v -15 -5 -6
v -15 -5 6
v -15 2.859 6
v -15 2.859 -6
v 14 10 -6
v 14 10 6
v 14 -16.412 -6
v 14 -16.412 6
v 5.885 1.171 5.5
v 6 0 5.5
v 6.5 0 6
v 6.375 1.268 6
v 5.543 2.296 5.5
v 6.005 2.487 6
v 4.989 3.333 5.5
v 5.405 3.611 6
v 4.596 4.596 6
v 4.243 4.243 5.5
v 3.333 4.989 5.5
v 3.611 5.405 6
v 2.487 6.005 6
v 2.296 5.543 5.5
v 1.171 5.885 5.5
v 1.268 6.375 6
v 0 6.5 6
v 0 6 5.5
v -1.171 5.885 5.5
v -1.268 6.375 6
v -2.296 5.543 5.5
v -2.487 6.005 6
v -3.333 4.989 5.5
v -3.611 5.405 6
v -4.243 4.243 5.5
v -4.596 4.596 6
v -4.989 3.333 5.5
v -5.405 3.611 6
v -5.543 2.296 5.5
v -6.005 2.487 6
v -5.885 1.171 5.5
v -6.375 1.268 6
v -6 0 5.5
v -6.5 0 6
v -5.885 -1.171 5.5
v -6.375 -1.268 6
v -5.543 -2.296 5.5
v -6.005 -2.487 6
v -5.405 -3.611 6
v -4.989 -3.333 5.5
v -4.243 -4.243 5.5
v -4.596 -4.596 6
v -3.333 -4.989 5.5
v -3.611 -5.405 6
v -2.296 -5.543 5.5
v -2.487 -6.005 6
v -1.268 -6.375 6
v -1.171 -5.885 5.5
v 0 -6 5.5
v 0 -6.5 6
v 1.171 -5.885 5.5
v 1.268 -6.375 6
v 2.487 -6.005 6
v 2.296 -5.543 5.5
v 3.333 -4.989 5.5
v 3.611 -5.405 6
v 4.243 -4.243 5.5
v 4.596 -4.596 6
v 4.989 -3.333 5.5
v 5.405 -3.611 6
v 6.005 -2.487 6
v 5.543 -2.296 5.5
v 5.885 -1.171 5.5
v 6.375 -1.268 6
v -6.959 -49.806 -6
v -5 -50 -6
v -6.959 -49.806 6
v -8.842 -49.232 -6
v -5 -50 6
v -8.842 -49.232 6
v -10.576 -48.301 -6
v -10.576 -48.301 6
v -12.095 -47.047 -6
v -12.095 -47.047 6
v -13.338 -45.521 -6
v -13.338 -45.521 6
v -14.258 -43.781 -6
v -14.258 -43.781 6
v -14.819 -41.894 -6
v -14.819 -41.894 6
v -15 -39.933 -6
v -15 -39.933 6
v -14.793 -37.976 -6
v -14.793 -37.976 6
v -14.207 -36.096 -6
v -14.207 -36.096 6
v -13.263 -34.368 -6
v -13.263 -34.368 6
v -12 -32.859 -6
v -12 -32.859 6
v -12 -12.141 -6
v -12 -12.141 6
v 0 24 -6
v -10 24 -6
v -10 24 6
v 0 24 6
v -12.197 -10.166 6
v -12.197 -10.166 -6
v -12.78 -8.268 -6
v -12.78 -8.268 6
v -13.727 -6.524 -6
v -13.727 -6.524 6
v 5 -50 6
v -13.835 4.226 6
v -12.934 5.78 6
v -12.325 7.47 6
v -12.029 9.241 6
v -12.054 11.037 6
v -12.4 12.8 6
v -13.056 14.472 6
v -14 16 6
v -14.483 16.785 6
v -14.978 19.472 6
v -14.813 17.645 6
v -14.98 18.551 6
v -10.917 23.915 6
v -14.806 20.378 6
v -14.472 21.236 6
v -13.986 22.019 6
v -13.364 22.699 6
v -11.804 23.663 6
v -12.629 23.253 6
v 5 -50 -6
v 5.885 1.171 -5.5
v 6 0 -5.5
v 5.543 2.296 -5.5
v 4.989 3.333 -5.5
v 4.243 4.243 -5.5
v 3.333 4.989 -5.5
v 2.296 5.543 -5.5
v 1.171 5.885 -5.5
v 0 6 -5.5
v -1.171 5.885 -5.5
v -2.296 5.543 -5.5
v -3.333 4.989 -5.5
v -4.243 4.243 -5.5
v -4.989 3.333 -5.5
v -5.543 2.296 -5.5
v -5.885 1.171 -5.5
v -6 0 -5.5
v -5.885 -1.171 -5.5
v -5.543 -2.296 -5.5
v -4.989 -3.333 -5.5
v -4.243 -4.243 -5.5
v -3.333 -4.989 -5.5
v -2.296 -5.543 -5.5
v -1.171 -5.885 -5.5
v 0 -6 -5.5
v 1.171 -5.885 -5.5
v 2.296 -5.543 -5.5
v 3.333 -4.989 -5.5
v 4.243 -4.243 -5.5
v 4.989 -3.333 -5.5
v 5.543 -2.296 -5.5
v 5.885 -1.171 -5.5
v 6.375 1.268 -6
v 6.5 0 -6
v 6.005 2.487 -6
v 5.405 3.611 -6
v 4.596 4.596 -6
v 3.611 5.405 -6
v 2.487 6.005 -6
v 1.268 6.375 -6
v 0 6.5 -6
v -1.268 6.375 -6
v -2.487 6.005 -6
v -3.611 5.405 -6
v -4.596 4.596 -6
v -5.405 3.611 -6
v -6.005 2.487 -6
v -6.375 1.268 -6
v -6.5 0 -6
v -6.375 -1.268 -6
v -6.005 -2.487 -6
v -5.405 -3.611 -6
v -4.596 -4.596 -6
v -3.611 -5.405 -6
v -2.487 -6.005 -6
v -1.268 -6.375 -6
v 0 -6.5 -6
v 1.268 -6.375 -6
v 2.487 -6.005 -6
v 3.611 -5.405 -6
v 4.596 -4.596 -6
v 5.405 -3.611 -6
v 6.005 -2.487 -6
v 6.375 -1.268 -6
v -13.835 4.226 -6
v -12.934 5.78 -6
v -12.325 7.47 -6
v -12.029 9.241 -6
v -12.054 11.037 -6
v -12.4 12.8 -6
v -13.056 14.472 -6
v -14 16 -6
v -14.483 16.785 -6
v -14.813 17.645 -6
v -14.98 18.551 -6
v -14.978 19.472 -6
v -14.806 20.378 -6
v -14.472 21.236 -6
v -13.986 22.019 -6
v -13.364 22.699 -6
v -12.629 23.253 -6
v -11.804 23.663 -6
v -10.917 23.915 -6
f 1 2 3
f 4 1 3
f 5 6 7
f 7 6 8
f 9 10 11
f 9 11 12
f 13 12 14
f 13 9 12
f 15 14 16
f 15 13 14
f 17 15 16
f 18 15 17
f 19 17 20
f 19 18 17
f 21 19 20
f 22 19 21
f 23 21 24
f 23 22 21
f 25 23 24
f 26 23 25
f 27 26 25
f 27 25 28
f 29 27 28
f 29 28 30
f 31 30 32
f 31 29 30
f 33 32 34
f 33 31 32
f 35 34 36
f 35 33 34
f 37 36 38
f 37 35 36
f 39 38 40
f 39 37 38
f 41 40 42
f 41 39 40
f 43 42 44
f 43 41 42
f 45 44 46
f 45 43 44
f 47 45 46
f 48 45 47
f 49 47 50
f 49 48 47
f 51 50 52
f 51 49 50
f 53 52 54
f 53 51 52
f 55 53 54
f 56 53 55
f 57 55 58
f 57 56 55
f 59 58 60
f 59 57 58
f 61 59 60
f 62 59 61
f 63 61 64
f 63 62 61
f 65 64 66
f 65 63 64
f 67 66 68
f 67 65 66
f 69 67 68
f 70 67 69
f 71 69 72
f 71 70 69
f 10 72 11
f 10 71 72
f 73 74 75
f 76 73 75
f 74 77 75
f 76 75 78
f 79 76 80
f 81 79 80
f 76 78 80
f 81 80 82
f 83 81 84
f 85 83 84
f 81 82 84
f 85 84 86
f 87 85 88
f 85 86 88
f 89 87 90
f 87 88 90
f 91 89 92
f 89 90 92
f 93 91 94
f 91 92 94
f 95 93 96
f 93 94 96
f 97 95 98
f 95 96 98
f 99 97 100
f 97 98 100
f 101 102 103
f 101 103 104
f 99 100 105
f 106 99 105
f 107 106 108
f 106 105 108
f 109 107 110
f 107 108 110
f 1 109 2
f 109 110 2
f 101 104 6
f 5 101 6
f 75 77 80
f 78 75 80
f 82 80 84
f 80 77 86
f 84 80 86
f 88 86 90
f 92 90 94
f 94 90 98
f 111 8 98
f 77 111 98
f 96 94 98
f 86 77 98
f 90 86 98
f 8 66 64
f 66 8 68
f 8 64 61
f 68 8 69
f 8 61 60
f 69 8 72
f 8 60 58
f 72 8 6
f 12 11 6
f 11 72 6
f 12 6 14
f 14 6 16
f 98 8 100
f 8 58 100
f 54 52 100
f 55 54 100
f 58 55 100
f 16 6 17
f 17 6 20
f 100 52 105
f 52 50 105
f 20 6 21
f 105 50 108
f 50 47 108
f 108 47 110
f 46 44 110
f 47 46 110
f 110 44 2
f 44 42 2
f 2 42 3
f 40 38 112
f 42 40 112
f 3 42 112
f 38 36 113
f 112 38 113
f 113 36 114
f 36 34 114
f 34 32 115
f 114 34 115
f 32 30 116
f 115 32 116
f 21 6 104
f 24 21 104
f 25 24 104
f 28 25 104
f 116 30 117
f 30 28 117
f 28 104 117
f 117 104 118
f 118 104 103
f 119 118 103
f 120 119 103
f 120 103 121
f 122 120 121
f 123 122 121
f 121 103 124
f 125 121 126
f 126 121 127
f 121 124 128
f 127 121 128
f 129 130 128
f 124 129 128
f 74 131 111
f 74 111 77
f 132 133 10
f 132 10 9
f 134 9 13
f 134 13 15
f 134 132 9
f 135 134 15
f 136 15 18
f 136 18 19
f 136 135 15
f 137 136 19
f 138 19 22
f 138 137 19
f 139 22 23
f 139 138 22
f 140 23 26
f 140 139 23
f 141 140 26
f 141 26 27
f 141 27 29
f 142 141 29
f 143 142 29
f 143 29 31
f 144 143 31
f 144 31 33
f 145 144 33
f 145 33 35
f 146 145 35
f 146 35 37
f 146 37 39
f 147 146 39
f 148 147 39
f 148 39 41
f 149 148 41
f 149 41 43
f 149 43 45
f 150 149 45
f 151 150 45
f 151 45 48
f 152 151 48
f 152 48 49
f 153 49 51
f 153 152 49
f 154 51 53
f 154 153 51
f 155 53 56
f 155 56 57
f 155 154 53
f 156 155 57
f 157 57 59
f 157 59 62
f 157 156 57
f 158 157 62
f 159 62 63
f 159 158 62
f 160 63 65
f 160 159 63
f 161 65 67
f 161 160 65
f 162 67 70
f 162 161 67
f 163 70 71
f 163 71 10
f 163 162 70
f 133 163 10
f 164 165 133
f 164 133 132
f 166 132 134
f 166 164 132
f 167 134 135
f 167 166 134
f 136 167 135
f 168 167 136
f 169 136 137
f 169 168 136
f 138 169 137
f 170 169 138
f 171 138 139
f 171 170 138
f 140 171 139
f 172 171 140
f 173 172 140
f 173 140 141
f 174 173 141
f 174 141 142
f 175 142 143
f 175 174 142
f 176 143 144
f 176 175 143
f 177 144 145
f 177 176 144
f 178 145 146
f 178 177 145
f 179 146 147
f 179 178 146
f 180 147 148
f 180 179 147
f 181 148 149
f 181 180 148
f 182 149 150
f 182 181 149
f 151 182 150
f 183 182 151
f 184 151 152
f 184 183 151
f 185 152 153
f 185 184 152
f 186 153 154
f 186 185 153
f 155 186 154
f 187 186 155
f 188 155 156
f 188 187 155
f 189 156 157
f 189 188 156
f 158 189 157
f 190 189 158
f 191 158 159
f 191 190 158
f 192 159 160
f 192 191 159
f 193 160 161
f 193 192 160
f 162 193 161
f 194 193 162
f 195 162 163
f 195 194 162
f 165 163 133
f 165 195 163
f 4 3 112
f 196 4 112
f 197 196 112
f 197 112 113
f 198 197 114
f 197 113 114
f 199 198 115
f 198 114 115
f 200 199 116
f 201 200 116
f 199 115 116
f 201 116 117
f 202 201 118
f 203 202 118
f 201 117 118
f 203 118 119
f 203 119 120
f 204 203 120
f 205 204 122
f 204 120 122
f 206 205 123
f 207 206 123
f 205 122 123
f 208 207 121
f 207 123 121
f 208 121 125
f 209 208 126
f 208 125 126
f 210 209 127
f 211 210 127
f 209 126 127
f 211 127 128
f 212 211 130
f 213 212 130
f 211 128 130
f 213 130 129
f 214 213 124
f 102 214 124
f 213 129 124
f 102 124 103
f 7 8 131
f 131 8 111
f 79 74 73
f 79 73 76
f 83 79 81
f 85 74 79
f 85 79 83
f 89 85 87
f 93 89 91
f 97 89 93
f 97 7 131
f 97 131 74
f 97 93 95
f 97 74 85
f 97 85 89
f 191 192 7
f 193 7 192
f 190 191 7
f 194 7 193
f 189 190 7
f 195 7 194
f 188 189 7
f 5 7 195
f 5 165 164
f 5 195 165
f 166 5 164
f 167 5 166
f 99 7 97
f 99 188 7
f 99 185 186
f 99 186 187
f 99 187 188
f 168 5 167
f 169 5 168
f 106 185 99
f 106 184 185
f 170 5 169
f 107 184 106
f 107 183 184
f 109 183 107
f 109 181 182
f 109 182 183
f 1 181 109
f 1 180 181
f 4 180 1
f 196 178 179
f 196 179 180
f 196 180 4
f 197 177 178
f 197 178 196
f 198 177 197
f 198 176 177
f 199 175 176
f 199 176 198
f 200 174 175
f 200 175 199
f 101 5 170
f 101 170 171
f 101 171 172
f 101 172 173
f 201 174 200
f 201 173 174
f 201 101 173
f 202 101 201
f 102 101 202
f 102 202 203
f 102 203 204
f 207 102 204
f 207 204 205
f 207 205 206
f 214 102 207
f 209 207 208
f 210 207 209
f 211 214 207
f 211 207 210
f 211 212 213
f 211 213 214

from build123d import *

# Parameters (mm, degrees)
SKETCH_1_R      = 6
EXTRUDE_1_DEPTH = 6
CHAMFER_1_SIZE  = 0.5


with BuildPart() as part:
    # Эскиз1 → Бобышка-Вытянуть1 (new, symmetric)
    with BuildSketch(Plane.XY):
        with BuildLine():
            Line((0, 24), (14, 10))
            Line((14, 10), (14, -16.411542732))
            Line((14, -16.411542732), (5, -50))
            Line((5, -50), (-5, -50))
            ThreePointArc((-5, -50), (-14.257815193, -43.780589618), (-12, -32.858571571))
            Line((-12, -32.858571571), (-12, -12.141428429))
            ThreePointArc((-12, -12.141428429), (-12.780455543, -8.268445082), (-15, -5))
            Line((-15, -5), (-15, 2.858571571))
            ThreePointArc((-15, 2.858571571), (-12.028827286, 9.241241333), (-14, 16))
            ThreePointArc((-14, 16), (-14.472135955, 21.236067977), (-10, 24))
            Line((-10, 24), (0, 24))
        make_face()
        Circle(SKETCH_1_R, mode=Mode.SUBTRACT)
    extrude(amount=EXTRUDE_1_DEPTH, both=True)

    # Фаска1
    chamfer_1_edges = [part.edges().sort_by_distance(p)[0] for p in [
        (-6, 0, -6),
        (-6, 0, 6),
    ]]
    chamfer(chamfer_1_edges, length=CHAMFER_1_SIZE)


solid = part.part
